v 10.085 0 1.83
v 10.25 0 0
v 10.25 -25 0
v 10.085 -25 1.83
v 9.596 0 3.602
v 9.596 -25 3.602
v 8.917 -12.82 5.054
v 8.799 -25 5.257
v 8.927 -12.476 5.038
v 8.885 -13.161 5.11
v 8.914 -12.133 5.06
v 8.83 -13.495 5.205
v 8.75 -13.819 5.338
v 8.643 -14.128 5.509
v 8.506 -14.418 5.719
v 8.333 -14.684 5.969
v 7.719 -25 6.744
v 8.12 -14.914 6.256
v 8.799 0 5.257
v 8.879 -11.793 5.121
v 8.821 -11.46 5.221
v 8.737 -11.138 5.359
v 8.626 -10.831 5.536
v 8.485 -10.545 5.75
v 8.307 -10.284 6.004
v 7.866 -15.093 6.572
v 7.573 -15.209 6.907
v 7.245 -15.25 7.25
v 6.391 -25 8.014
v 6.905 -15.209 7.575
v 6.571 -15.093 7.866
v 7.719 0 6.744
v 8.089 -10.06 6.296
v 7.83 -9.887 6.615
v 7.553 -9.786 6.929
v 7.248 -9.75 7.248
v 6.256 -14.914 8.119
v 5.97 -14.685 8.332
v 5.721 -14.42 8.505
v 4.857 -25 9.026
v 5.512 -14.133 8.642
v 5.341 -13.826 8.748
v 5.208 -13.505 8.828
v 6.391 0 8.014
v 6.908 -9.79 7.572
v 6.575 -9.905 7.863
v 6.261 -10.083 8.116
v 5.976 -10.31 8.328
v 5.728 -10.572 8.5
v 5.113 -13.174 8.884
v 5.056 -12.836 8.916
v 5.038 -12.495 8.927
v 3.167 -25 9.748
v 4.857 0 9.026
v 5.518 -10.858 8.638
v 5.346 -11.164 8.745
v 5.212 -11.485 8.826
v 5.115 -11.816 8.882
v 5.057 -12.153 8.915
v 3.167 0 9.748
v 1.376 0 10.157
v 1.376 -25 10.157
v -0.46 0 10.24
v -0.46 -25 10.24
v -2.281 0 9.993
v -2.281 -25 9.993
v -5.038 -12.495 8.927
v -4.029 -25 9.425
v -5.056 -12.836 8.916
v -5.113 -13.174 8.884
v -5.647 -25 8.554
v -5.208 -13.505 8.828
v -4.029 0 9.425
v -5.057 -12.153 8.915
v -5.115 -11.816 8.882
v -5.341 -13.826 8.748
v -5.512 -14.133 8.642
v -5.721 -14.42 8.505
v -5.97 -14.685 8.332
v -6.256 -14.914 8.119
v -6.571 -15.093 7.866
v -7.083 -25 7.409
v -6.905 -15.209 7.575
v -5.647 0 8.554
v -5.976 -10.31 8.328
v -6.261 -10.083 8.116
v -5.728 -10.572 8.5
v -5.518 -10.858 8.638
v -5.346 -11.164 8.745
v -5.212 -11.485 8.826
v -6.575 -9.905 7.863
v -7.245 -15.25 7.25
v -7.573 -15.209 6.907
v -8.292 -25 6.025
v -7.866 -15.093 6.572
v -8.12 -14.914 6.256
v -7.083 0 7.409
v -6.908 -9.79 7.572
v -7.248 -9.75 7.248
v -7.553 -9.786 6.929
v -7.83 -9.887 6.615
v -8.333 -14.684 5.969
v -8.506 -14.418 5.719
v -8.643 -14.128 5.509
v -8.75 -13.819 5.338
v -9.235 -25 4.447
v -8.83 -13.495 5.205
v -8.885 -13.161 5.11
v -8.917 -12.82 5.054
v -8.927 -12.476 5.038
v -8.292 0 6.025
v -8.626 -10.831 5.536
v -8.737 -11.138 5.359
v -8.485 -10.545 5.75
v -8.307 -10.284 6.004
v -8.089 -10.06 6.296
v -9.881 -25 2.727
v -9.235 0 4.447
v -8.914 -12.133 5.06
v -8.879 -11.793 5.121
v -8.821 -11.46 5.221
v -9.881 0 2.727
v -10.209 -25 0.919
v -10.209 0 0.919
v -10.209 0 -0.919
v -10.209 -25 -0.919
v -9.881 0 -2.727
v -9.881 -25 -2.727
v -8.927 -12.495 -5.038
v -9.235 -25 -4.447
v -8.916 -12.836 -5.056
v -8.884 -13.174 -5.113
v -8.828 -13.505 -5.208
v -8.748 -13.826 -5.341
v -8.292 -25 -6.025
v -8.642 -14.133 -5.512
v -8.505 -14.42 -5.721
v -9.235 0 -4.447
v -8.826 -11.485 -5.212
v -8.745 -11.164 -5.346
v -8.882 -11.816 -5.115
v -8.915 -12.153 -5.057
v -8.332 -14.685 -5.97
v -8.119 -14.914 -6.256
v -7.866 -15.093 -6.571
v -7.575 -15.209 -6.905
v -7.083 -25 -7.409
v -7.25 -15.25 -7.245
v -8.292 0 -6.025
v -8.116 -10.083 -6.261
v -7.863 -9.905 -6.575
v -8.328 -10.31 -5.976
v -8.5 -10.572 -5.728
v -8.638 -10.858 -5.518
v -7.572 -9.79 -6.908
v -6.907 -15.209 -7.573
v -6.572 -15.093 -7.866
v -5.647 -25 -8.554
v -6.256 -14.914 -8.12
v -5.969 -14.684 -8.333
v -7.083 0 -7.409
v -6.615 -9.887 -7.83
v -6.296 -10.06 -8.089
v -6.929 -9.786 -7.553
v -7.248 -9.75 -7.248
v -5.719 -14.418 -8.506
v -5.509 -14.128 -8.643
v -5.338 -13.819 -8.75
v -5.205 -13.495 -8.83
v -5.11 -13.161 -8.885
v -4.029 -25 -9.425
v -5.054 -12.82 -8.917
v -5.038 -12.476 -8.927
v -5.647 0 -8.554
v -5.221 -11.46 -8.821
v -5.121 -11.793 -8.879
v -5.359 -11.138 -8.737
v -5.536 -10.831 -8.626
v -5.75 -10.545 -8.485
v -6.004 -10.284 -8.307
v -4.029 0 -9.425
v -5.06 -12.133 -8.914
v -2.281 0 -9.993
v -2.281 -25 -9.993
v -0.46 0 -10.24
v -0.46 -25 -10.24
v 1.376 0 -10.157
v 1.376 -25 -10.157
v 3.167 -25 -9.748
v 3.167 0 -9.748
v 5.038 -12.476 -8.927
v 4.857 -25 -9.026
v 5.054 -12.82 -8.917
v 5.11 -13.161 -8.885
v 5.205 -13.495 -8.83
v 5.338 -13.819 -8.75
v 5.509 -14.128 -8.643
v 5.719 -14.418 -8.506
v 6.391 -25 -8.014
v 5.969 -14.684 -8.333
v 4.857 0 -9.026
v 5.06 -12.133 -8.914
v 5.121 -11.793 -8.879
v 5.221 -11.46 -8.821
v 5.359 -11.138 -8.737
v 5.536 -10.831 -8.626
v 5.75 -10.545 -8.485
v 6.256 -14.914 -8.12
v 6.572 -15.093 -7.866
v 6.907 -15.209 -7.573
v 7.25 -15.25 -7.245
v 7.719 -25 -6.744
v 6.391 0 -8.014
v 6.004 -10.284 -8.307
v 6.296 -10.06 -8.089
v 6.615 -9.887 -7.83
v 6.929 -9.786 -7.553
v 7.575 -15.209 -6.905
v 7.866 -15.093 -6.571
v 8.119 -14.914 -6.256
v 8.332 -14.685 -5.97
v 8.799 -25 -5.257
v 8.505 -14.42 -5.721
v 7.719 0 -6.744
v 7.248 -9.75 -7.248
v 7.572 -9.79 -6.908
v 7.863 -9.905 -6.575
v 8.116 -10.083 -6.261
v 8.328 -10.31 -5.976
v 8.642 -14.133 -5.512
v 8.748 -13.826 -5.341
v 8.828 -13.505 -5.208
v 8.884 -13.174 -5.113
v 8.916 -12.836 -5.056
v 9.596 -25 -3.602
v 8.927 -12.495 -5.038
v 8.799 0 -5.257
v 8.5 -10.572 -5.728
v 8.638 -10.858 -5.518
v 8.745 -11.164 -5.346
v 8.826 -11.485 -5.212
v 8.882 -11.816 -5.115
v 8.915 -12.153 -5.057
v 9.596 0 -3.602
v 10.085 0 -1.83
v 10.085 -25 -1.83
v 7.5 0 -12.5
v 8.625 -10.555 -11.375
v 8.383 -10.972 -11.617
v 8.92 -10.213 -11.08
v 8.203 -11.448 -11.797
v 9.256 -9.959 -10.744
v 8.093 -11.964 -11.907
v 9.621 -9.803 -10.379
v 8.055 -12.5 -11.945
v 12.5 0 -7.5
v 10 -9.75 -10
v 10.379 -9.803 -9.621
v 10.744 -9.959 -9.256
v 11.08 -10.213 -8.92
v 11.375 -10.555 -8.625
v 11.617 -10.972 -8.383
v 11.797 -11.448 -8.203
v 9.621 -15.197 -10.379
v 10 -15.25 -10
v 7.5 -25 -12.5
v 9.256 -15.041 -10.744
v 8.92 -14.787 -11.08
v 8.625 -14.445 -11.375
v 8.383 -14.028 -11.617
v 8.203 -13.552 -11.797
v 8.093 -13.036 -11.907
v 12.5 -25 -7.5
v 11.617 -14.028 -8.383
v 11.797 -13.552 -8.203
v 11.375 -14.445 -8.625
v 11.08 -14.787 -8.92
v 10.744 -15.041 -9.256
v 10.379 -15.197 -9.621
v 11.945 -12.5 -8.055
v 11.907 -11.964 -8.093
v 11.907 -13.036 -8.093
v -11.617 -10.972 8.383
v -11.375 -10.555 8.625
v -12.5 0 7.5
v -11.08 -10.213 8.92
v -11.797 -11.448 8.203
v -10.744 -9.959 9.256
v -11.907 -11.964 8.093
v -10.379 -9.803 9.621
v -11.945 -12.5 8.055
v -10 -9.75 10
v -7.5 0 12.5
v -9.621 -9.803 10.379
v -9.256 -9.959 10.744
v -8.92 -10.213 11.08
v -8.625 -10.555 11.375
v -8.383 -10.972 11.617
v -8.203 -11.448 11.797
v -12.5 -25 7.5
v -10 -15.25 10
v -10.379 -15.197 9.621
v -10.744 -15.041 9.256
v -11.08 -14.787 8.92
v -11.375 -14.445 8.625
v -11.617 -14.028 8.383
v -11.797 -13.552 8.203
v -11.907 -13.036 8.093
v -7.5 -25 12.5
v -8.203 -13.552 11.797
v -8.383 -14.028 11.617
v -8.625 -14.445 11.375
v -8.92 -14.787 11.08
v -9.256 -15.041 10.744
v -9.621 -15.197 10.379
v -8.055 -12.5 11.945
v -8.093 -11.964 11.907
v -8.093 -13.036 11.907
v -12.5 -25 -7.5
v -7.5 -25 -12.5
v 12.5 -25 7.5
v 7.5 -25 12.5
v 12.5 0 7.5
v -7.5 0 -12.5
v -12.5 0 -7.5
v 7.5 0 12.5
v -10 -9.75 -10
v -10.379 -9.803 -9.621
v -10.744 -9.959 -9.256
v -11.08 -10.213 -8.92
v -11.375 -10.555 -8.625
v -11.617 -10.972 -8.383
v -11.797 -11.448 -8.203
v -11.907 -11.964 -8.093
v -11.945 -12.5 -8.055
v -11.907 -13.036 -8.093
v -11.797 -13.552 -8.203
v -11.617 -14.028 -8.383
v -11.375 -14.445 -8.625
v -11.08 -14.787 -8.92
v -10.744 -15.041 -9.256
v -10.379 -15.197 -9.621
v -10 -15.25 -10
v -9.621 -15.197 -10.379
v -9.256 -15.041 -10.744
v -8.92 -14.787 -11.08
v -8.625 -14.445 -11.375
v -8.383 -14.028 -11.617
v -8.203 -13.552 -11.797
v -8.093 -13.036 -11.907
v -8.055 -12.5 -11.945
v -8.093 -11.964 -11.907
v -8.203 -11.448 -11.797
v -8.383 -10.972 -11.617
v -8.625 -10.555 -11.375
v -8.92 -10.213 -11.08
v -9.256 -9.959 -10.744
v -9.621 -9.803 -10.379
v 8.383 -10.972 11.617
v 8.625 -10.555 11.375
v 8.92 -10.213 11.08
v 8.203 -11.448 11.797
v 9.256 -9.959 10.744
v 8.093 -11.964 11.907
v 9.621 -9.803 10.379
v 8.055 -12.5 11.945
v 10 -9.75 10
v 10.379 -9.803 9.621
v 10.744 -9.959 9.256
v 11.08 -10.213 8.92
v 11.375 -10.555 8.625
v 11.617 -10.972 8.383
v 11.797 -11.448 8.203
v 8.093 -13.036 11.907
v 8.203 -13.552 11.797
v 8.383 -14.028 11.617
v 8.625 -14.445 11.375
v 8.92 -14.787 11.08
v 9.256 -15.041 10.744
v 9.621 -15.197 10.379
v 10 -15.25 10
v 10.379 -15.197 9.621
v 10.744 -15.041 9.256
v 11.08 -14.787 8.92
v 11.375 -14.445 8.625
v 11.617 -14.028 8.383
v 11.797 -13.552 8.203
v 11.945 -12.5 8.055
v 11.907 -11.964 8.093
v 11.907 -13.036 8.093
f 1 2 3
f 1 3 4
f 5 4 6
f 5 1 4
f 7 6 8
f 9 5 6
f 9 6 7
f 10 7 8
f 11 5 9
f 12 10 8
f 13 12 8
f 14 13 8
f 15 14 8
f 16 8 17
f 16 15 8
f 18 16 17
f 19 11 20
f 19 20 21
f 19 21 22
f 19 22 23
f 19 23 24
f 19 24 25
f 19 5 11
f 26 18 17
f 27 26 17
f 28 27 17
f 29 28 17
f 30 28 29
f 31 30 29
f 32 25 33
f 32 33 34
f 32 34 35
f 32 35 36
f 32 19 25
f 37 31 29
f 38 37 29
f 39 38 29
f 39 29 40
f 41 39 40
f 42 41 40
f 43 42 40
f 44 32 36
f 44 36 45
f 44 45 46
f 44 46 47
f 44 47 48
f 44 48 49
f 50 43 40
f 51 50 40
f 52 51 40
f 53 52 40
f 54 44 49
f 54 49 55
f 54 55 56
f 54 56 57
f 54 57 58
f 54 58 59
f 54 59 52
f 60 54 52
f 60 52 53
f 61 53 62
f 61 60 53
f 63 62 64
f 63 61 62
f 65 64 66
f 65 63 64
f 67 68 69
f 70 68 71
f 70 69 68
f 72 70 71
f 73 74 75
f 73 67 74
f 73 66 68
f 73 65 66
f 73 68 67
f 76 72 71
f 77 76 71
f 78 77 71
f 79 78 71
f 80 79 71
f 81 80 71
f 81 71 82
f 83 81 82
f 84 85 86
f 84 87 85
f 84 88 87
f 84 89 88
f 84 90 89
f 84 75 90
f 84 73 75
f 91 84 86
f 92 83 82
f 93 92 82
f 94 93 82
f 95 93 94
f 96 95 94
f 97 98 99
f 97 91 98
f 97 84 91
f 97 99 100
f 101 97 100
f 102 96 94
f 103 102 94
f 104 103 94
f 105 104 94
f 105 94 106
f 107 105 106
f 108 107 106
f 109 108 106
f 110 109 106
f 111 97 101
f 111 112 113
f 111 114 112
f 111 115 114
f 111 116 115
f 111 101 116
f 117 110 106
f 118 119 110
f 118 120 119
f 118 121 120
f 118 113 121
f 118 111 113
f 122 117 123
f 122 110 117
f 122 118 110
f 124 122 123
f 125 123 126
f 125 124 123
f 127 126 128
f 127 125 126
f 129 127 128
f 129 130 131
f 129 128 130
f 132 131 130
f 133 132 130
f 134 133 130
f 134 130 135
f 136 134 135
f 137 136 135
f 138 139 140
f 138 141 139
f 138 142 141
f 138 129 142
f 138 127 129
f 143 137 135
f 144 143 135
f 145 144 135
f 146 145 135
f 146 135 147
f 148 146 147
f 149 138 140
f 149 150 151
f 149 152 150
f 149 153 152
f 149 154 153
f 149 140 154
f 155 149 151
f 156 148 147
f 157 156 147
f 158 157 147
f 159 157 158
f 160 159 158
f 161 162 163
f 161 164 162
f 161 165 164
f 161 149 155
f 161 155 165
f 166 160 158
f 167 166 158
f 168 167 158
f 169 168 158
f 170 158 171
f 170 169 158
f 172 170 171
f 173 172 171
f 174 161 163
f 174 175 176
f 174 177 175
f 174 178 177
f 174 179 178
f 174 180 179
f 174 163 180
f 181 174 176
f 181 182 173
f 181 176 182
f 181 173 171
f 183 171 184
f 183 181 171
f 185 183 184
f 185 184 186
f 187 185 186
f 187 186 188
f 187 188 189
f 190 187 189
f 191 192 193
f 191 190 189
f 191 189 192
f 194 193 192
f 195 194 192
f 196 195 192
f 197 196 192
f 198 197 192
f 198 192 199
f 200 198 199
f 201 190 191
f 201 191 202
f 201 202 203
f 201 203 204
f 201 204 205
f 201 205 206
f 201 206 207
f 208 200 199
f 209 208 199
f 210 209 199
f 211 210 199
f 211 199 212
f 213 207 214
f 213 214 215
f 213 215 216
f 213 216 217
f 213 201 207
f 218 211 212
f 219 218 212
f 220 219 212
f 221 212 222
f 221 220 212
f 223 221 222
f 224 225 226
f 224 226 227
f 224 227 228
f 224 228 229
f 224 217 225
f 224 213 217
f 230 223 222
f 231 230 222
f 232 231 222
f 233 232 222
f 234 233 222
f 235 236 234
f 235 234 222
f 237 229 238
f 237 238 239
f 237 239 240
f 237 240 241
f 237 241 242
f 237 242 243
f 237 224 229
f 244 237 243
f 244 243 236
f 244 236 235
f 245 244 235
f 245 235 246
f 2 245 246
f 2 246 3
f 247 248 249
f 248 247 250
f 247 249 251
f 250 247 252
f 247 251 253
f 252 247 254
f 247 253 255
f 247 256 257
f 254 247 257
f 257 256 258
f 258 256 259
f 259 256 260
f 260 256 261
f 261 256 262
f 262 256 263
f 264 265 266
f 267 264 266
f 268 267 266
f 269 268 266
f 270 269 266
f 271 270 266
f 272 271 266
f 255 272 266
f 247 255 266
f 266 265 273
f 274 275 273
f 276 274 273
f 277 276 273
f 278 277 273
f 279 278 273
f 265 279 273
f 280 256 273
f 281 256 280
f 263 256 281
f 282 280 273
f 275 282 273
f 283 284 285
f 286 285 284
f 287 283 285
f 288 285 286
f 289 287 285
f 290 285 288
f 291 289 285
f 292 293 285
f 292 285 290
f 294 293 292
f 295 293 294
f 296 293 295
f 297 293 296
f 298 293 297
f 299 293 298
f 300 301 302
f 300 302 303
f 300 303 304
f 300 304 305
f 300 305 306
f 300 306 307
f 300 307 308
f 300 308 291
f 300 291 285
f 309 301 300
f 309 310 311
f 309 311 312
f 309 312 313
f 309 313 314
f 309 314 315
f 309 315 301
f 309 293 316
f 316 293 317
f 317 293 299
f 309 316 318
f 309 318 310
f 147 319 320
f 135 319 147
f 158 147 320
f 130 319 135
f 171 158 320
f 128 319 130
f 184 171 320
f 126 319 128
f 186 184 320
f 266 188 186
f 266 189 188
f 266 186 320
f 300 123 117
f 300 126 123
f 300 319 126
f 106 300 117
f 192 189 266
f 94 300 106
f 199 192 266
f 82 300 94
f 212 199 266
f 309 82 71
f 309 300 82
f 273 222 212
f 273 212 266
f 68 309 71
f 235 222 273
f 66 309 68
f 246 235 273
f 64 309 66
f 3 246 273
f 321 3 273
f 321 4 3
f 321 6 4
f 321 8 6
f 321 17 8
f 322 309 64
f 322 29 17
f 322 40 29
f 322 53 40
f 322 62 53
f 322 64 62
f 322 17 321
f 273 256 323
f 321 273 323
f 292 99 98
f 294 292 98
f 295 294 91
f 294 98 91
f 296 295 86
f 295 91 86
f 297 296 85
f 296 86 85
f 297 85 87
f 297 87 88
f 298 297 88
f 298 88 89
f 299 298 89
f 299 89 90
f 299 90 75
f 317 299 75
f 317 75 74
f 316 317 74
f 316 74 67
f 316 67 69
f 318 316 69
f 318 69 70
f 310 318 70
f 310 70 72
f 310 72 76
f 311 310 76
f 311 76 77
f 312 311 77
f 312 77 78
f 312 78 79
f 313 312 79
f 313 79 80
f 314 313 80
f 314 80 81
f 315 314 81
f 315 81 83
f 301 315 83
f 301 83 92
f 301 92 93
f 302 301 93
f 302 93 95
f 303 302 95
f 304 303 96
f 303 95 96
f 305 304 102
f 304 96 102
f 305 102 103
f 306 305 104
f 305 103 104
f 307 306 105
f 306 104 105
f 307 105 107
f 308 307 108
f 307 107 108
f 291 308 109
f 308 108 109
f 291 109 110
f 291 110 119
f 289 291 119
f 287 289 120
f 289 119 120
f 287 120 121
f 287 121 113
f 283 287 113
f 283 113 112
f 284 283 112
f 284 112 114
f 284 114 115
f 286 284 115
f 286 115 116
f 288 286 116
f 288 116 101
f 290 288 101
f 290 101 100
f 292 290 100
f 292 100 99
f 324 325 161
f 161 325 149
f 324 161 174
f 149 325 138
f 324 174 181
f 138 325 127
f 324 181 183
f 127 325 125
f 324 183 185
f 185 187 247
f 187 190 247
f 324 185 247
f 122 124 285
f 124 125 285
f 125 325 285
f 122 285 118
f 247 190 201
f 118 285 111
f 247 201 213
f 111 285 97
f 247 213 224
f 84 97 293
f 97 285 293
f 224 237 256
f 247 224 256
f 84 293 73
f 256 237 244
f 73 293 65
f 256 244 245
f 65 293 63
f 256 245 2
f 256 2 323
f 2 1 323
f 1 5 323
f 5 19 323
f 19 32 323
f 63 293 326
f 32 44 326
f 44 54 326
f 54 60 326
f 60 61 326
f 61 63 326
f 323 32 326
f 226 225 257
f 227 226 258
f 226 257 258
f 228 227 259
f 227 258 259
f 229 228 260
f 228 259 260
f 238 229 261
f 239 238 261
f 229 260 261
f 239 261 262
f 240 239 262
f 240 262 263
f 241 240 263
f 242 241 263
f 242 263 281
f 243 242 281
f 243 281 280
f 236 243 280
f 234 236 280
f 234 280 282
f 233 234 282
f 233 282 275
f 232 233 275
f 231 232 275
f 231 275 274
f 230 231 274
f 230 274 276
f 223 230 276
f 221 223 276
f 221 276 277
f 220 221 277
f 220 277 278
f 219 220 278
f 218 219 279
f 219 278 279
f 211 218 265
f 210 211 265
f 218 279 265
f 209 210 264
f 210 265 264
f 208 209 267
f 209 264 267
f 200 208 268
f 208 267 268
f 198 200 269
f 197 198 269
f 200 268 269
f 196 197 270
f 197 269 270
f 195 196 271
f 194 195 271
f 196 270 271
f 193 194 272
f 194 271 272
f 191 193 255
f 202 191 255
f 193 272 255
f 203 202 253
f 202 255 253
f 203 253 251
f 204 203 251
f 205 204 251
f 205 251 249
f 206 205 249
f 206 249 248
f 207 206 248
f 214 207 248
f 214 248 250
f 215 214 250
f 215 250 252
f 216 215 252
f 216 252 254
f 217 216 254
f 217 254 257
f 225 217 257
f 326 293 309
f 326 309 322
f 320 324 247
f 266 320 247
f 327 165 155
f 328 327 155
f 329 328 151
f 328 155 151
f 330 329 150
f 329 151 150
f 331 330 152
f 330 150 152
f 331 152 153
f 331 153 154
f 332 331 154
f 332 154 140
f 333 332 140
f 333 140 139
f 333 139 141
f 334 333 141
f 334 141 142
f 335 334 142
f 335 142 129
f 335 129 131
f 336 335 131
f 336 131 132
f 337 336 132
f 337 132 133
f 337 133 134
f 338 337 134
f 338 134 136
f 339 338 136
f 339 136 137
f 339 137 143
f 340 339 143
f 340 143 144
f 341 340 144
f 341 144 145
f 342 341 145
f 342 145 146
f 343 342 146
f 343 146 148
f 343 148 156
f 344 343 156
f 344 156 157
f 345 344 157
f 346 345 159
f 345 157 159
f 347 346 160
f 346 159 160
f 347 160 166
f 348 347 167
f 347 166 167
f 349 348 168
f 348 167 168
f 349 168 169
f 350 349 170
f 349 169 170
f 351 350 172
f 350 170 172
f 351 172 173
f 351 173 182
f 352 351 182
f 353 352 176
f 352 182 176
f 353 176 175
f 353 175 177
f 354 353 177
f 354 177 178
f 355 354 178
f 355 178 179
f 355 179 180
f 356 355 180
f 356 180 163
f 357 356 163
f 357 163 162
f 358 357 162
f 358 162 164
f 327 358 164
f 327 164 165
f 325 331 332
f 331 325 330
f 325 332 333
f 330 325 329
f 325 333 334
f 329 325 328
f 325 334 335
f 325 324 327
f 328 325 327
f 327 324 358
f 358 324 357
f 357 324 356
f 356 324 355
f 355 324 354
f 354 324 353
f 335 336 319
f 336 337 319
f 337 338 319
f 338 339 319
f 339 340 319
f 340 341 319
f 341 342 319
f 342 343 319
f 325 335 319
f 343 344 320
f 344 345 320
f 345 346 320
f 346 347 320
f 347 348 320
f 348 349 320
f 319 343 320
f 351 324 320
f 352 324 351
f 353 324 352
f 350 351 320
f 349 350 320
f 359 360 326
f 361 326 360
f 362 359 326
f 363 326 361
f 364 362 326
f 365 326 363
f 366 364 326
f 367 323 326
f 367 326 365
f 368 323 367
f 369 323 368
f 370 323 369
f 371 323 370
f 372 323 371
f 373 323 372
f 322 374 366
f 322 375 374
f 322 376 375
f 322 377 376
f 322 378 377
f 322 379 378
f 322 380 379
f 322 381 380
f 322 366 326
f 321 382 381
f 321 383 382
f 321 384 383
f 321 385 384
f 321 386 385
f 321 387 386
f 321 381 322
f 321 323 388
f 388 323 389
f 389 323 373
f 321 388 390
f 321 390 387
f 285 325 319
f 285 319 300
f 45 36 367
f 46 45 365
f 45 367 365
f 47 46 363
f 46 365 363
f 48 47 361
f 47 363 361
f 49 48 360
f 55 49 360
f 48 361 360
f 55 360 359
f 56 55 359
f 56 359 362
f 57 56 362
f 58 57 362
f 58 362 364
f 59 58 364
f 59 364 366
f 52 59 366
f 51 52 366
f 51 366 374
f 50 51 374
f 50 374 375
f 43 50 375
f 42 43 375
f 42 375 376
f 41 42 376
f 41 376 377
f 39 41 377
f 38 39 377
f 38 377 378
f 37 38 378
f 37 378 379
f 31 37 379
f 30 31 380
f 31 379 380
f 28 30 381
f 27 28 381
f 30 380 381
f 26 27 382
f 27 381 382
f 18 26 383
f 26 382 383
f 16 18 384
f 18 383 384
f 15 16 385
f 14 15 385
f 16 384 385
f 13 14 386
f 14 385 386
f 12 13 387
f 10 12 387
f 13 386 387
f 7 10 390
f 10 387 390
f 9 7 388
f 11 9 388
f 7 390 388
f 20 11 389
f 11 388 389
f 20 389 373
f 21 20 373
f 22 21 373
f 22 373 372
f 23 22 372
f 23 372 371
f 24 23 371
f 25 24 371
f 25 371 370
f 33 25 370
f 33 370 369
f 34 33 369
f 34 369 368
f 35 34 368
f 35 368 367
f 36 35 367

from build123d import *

# Parameters (mm, degrees)
F0_W     = 25
F0_H     = 25
F0_R     = 10.25
F1_DEPTH = 25
F2_SIZE  = 5
F3_R     = 2.75
F4_DEPTH = 31.820805
F5_R     = 2.75
F6_DEPTH = 31.820805


with BuildPart() as f1:
    # F0 (on Front) → F1 (new body)
    with BuildSketch(Plane.XZ):
        Rectangle(F0_W, F0_H)
        Circle(F0_R, mode=Mode.SUBTRACT)
    extrude(amount=F1_DEPTH)

    # F2
    f2_edges = [f1.edges().sort_by_distance(p)[0] for p in [
        (-12.5, -12.5, -12.5),
        (12.5, -12.5, -12.5),
        (12.5, -12.5, 12.5),
        (-12.5, -12.5, 12.5),
    ]]
    chamfer(f2_edges, length=F2_SIZE)

    # F3 (on face) → F4 (cut, through all)
    with BuildSketch(Plane(origin=(10, 0, 10), x_dir=(0, 1, 0), z_dir=(0.707107, 0, 0.707107))):
        with Locations((-12.5, 0)):
            Circle(F3_R)
    extrude(amount=-F4_DEPTH, mode=Mode.SUBTRACT)

    # F5 (on face) → F6 (cut, through all)
    with BuildSketch(Plane(origin=(10, 0, -10), x_dir=(0, 1, 0), z_dir=(0.707107, 0, -0.707107))):
        with Locations((-12.5, 0)):
            Circle(F5_R)
    extrude(amount=-F6_DEPTH, mode=Mode.SUBTRACT)


solid = f1.part
